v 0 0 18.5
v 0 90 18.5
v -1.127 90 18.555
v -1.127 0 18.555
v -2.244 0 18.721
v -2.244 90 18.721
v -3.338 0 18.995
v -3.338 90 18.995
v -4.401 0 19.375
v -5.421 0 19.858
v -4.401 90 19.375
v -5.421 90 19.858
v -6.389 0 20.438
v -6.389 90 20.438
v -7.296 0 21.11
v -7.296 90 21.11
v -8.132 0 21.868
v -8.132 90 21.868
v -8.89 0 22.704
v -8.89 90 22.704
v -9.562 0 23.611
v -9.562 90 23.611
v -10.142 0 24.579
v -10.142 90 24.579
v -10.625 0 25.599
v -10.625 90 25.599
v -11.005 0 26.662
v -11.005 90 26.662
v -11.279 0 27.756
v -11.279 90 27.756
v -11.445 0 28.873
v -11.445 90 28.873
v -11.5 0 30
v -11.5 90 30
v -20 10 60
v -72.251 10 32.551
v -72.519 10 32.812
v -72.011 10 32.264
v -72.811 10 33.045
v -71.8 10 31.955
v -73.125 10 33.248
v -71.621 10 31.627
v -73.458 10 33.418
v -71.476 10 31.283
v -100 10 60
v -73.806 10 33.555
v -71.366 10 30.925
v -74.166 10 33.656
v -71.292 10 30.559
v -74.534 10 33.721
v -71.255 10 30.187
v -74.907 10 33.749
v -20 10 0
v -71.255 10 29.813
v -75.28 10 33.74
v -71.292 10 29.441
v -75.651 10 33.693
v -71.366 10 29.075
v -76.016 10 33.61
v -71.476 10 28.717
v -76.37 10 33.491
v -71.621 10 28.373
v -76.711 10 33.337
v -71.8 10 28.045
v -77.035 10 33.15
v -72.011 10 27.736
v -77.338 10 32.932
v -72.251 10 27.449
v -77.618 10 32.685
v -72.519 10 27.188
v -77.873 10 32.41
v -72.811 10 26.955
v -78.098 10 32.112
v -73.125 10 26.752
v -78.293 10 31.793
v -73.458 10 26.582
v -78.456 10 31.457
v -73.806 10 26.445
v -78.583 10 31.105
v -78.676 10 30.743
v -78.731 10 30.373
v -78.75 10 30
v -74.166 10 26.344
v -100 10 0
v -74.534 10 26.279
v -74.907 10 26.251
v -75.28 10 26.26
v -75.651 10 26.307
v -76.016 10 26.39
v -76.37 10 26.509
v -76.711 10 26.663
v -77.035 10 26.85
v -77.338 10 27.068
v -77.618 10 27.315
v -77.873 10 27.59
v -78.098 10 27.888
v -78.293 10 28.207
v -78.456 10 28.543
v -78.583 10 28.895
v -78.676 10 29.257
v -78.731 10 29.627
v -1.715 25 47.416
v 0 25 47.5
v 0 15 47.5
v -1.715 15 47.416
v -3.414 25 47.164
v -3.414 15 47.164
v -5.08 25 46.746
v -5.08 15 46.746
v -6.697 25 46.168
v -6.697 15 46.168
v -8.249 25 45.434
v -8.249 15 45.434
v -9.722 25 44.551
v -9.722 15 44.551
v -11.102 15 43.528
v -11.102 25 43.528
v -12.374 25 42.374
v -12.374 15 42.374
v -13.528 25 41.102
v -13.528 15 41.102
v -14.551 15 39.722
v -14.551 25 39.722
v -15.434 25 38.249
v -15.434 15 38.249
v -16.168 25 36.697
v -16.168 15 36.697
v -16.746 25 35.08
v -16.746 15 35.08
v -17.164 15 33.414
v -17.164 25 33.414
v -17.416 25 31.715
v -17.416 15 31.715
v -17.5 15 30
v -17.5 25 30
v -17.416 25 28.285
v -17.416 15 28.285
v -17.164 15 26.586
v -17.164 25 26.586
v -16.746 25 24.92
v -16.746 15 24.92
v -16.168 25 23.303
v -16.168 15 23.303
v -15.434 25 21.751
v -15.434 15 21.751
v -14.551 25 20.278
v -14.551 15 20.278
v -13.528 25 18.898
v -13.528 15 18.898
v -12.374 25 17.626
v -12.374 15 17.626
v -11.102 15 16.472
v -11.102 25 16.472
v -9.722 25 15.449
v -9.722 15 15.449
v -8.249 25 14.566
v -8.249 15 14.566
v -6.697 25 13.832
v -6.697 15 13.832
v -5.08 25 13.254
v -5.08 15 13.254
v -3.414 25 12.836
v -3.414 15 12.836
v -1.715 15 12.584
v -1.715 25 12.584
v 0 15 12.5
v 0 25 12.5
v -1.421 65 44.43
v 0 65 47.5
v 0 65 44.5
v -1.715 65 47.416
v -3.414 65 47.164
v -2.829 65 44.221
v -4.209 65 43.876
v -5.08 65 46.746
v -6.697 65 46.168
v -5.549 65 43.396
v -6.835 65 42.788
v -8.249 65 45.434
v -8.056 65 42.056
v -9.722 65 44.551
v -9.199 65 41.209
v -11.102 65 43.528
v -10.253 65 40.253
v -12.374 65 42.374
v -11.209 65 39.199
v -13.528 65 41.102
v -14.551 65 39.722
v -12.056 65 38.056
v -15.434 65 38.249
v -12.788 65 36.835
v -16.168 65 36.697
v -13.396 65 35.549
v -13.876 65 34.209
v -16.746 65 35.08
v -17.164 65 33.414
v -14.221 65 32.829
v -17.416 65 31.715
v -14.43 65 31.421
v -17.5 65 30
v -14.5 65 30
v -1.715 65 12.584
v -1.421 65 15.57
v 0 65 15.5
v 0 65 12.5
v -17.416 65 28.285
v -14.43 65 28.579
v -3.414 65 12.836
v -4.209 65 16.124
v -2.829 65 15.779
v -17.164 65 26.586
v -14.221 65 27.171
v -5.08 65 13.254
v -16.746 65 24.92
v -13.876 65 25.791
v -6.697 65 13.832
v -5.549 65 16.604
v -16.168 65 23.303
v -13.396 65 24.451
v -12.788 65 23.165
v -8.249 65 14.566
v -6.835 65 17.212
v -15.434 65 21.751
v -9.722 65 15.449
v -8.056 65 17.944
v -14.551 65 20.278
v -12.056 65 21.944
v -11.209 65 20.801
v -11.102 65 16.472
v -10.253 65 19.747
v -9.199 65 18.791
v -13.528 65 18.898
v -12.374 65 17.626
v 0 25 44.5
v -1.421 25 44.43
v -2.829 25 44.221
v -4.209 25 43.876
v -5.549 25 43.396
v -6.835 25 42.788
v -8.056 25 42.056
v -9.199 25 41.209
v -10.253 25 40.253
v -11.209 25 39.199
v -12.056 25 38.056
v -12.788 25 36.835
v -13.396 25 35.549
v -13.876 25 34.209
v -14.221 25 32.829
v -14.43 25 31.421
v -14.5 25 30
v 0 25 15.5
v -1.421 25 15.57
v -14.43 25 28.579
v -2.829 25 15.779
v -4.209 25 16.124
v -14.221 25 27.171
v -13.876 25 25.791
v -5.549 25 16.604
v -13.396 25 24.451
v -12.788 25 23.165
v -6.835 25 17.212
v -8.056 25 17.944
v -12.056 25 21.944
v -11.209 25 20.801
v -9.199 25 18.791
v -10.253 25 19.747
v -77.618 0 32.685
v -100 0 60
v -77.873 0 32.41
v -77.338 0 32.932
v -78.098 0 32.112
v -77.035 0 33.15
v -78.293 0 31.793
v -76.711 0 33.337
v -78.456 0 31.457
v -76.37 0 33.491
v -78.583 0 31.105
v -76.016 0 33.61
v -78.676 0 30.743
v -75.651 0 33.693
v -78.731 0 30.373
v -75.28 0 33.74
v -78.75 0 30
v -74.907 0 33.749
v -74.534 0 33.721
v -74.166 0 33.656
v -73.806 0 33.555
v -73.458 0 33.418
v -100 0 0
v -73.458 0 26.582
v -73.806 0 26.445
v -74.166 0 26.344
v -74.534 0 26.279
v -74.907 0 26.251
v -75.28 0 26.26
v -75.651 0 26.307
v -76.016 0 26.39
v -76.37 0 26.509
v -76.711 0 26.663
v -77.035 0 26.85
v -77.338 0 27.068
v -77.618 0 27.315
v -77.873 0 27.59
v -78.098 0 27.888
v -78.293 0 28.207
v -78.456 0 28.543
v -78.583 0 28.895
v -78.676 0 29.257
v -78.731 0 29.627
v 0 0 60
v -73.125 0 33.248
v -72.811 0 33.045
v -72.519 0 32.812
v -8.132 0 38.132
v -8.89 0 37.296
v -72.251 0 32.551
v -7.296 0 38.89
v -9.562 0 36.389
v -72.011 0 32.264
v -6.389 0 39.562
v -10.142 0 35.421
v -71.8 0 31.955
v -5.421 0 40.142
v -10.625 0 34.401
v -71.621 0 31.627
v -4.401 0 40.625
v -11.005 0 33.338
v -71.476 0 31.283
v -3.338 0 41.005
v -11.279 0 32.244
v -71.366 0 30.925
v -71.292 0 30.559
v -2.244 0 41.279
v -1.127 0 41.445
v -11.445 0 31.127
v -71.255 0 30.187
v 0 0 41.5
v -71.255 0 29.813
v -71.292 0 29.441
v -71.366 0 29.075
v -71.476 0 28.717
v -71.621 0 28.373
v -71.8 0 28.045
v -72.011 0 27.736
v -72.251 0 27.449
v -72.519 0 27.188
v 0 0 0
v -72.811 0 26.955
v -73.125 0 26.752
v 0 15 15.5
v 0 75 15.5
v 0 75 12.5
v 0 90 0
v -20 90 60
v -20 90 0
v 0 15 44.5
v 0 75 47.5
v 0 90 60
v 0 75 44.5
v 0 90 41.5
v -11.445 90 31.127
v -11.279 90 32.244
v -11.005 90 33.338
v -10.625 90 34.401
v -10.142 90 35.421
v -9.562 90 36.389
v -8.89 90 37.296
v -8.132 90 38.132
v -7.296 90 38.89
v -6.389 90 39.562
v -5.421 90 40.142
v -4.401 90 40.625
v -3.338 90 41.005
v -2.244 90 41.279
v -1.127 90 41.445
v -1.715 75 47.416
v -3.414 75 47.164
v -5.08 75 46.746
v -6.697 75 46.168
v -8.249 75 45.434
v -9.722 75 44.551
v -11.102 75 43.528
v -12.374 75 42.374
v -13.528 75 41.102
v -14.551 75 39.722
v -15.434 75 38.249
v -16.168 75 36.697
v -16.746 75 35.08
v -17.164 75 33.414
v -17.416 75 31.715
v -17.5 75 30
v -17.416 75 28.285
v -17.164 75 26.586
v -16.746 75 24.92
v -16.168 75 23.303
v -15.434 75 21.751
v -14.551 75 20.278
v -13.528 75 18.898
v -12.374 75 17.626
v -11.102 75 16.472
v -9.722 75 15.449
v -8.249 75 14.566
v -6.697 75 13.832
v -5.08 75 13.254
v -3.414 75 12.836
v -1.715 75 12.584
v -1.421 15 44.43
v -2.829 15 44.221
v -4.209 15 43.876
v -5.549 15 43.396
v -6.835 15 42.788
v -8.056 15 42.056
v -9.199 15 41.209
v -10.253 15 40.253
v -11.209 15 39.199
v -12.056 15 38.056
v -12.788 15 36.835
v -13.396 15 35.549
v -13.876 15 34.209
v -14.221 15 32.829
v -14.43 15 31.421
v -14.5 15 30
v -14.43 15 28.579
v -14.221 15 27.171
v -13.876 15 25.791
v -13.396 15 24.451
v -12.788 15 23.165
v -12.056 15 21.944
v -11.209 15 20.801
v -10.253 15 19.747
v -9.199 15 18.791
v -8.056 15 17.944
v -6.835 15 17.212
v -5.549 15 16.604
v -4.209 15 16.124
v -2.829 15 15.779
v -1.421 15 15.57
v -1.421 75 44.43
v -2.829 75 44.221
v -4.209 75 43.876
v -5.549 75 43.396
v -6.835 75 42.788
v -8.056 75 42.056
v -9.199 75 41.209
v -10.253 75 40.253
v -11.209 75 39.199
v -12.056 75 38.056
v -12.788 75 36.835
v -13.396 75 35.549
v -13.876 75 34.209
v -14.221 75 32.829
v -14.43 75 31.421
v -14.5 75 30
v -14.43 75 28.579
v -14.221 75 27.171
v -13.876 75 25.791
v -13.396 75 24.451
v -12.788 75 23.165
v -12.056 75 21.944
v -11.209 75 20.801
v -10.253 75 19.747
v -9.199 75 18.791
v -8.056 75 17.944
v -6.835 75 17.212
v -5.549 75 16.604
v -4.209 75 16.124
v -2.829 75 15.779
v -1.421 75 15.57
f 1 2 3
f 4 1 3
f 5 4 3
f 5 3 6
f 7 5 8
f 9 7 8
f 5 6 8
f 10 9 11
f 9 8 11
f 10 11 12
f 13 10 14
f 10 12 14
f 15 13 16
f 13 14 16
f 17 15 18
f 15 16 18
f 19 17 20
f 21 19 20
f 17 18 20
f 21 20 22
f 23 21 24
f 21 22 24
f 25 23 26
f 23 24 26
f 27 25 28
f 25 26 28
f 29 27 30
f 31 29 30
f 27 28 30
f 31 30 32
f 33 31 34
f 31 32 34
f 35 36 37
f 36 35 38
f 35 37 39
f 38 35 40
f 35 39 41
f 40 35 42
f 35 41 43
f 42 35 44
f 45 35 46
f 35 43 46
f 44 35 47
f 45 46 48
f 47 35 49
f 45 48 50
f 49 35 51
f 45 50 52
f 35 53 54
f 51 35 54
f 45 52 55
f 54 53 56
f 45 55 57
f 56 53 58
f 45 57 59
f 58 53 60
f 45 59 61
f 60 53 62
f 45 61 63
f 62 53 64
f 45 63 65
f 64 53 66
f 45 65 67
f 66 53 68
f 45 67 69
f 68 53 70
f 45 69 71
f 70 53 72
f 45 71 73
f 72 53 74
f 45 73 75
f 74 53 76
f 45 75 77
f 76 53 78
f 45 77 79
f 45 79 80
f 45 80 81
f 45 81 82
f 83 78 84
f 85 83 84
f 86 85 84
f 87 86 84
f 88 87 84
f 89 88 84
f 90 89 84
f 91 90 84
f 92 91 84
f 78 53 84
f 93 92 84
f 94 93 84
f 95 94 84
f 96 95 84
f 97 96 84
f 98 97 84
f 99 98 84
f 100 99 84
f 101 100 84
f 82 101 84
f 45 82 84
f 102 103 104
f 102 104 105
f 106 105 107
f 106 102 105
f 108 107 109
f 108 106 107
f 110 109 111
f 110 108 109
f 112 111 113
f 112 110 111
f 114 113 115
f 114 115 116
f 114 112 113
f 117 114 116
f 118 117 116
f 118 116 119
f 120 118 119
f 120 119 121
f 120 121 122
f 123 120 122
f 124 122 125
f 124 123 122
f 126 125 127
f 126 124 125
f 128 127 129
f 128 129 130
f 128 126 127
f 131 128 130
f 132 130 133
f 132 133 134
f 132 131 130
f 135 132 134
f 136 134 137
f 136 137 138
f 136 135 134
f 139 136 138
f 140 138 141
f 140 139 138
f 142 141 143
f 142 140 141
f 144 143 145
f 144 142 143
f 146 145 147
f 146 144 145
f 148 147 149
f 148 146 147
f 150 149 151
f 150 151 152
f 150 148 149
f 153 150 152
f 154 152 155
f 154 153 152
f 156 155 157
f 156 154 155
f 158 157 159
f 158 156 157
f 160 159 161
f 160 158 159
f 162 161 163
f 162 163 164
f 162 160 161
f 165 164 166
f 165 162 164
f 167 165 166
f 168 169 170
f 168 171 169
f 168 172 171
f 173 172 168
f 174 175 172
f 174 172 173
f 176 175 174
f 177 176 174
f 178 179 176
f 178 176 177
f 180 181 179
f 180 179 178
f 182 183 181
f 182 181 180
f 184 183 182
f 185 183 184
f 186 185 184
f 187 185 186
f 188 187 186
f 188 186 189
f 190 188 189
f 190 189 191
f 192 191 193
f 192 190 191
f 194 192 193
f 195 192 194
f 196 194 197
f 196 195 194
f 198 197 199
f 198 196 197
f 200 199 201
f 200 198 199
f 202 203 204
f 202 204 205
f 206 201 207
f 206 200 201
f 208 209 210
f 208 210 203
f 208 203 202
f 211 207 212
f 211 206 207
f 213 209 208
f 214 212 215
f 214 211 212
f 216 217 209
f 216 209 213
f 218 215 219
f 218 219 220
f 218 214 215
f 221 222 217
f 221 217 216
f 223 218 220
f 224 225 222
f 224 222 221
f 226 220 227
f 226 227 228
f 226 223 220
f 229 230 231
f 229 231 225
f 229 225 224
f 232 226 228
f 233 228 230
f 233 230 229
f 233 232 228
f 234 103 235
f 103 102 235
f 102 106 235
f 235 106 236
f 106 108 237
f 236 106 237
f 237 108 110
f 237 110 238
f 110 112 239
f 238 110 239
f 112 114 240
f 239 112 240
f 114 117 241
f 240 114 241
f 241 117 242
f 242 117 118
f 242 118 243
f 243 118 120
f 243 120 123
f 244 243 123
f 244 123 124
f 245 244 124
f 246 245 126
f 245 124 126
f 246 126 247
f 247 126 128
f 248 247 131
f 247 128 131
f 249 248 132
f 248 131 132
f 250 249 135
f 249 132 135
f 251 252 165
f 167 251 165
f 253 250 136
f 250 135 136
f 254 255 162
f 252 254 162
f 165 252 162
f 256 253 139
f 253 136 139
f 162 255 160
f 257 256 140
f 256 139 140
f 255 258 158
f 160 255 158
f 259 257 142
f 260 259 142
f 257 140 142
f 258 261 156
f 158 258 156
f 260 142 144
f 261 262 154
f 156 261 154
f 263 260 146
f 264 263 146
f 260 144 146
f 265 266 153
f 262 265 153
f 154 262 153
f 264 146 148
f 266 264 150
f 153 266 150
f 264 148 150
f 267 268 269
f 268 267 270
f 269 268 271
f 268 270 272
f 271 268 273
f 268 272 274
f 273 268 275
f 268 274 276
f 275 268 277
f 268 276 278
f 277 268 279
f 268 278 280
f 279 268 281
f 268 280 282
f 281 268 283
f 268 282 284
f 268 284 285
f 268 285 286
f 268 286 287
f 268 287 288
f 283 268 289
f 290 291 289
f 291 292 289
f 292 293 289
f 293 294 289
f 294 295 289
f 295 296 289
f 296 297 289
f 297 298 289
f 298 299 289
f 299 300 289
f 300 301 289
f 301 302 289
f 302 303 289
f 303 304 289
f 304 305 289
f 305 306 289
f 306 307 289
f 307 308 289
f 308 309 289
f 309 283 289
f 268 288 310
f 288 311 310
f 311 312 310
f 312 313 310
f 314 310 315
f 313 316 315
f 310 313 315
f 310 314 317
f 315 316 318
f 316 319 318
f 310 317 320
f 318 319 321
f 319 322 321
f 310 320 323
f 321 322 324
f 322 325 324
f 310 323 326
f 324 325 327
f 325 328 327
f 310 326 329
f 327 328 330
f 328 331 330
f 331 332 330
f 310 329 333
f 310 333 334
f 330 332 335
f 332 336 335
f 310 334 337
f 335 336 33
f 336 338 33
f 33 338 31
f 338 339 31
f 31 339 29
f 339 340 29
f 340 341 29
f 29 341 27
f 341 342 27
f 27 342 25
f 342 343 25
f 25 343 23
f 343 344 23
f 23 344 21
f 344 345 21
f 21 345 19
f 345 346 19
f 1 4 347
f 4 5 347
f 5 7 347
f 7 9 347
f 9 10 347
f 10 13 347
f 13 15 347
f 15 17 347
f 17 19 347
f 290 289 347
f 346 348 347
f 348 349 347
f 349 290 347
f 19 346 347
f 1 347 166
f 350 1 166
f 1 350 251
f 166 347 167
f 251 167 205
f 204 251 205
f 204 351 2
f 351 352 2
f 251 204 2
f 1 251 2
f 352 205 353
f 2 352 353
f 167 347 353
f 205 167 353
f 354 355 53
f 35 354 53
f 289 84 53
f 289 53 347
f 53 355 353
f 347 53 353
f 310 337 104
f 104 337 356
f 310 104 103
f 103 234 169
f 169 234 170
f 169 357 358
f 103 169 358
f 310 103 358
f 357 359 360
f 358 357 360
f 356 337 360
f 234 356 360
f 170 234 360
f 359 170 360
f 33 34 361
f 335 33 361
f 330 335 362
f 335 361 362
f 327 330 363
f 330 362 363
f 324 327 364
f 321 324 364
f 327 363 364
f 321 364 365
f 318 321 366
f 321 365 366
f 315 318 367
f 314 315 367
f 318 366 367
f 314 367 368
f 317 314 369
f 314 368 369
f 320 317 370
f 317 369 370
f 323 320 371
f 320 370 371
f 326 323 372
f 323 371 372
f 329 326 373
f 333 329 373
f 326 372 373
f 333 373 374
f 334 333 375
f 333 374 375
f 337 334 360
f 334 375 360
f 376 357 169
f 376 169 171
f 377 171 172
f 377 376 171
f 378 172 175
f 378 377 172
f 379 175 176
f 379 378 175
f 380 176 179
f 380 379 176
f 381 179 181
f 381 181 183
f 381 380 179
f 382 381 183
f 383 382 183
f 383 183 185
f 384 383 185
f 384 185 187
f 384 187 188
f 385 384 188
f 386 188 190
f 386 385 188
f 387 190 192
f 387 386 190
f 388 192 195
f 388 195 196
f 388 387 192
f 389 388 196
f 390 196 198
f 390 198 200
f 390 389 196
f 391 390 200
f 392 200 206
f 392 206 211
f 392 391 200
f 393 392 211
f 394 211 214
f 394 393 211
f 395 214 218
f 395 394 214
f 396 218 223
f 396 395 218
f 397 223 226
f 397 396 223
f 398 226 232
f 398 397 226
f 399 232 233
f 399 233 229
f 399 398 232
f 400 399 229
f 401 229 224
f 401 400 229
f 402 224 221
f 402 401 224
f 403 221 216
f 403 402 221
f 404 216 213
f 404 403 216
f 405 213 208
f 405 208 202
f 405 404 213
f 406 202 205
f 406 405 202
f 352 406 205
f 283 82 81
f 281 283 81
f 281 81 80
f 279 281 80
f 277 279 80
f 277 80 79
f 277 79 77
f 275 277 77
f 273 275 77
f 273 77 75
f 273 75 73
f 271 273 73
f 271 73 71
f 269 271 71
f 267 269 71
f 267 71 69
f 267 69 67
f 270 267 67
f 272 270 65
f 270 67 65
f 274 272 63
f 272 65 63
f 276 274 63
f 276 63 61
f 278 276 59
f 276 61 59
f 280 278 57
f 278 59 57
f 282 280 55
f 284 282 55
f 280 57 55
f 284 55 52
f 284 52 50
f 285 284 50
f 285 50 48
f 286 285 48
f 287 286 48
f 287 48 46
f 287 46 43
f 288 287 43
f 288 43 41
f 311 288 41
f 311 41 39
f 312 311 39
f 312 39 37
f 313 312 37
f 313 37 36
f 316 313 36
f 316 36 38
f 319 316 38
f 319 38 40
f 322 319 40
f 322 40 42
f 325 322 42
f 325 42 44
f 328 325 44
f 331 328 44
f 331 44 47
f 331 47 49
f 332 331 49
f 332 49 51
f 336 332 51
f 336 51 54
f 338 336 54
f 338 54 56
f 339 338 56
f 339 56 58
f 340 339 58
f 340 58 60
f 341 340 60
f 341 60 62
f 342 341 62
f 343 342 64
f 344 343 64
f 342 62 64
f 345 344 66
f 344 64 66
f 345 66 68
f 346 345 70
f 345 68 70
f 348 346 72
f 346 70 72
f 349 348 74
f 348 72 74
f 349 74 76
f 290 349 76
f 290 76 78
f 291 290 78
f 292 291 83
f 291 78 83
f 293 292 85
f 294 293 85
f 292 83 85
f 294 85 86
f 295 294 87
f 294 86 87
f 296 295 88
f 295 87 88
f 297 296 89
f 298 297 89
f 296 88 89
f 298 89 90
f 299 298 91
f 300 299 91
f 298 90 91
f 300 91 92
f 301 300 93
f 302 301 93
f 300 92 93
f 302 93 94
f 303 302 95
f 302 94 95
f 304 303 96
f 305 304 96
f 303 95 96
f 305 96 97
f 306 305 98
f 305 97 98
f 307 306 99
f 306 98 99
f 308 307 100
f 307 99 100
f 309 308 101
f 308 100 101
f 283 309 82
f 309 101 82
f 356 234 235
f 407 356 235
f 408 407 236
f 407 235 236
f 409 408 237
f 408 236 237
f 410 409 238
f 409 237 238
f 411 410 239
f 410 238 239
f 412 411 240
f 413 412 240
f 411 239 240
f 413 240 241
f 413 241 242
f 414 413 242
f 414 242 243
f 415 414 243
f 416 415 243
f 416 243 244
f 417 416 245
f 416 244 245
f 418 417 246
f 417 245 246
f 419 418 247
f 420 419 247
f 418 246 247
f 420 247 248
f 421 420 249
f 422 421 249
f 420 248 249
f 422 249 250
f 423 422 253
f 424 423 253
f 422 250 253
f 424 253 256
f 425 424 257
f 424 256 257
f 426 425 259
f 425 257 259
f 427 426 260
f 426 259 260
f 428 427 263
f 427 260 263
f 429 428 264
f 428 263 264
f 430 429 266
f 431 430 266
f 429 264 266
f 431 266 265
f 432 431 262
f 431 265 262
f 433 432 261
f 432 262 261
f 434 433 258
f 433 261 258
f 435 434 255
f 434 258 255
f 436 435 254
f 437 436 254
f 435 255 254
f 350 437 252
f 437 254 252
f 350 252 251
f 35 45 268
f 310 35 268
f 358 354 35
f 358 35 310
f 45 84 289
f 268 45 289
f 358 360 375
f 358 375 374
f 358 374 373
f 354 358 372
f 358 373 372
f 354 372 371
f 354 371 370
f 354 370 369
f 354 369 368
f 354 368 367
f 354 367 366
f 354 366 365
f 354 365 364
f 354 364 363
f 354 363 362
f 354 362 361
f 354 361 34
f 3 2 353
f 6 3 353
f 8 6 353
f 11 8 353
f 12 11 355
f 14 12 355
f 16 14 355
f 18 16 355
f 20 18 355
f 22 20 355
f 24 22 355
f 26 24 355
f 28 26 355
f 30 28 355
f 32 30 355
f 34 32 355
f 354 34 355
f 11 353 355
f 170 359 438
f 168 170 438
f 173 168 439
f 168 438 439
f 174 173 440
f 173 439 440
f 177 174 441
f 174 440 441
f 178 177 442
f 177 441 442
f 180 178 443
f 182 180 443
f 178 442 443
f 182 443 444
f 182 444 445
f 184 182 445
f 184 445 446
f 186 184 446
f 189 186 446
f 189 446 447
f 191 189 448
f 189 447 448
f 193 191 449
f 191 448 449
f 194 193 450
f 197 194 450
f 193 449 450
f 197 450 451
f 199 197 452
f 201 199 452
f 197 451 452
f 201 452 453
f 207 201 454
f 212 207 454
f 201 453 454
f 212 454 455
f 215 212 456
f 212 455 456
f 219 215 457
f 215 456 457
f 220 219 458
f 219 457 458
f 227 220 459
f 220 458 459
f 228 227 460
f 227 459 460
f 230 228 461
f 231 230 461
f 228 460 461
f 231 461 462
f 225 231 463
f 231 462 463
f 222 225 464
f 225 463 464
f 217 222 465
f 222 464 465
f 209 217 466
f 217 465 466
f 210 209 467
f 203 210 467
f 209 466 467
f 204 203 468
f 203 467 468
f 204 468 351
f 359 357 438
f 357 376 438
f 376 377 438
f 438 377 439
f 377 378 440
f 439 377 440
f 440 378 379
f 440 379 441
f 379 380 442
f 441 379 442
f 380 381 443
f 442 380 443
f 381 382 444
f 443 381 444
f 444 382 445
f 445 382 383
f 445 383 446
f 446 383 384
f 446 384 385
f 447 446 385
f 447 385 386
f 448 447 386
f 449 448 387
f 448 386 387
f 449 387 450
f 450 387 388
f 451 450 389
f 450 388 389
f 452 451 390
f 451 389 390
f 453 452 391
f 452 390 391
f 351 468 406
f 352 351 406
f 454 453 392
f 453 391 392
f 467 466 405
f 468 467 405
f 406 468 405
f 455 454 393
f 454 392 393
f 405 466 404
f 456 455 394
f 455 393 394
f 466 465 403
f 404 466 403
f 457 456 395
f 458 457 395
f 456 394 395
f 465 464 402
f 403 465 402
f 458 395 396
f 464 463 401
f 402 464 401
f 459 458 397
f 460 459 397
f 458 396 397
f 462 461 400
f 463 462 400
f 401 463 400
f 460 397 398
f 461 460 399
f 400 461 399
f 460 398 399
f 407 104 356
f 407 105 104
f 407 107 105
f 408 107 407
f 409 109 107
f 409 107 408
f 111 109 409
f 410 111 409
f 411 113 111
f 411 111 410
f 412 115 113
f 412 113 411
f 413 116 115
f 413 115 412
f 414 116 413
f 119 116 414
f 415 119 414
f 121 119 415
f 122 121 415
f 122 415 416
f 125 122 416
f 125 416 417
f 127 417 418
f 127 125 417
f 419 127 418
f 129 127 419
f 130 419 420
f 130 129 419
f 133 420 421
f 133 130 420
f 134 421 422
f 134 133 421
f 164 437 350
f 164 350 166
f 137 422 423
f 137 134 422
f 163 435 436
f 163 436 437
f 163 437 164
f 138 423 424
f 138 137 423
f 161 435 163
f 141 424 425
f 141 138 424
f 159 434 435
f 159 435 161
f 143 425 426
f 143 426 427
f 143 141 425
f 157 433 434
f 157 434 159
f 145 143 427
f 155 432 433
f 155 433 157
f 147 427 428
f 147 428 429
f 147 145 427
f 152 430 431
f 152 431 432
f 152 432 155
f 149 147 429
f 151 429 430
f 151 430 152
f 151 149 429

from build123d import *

# Parameters (mm, degrees)
F1_DEPTH = 60
F3_DEPTH = 90.001
F4_R     = 3.75
F5_DEPTH = 10.001
F6_W     = 10
F6_H     = 3


with BuildPart() as f1:
    # F0 (on Top) → F1 (new body)
    with BuildSketch(Plane.XY):
        Polygon((-100, 0), (0, 0), (0, 90), (-20, 90), (-20, 10), (-100, 10), align=None)
    extrude(amount=F1_DEPTH)

    # F2 (on face) → F3 (cut, through all)
    with BuildSketch(Plane(origin=(0, 90, 0), x_dir=(-1, 0, 0), z_dir=(0, 1, 0))):
        with BuildLine():
            ThreePointArc((0, 18.5), (8.131728, 21.868272), (11.5, 30))
            ThreePointArc((11.5, 30), (8.131728, 38.131728), (0, 41.5))
            Line((0, 41.5), (0, 18.5))
        make_face()
    extrude(amount=-F3_DEPTH, mode=Mode.SUBTRACT)

    # F4 (on face) → F5 (cut, through all)
    with BuildSketch(Plane(origin=(0, 10, 0), x_dir=(-1, 0, 0), z_dir=(0, 1, 0))):
        with Locations((75, 30)):
            Circle(F4_R)
    extrude(amount=-F5_DEPTH, mode=Mode.SUBTRACT)

    # F6 (on face) → F7 (revolve, cut)
    with BuildSketch(Plane.YZ):
        with Locations((70, 46)):
            Rectangle(F6_W, F6_H)
        with Locations((20, 46)):
            Rectangle(F6_W, F6_H)
    revolve(axis=Axis((0, 45, 30), (0, -1, 0)), mode=Mode.SUBTRACT)


solid = f1.part
